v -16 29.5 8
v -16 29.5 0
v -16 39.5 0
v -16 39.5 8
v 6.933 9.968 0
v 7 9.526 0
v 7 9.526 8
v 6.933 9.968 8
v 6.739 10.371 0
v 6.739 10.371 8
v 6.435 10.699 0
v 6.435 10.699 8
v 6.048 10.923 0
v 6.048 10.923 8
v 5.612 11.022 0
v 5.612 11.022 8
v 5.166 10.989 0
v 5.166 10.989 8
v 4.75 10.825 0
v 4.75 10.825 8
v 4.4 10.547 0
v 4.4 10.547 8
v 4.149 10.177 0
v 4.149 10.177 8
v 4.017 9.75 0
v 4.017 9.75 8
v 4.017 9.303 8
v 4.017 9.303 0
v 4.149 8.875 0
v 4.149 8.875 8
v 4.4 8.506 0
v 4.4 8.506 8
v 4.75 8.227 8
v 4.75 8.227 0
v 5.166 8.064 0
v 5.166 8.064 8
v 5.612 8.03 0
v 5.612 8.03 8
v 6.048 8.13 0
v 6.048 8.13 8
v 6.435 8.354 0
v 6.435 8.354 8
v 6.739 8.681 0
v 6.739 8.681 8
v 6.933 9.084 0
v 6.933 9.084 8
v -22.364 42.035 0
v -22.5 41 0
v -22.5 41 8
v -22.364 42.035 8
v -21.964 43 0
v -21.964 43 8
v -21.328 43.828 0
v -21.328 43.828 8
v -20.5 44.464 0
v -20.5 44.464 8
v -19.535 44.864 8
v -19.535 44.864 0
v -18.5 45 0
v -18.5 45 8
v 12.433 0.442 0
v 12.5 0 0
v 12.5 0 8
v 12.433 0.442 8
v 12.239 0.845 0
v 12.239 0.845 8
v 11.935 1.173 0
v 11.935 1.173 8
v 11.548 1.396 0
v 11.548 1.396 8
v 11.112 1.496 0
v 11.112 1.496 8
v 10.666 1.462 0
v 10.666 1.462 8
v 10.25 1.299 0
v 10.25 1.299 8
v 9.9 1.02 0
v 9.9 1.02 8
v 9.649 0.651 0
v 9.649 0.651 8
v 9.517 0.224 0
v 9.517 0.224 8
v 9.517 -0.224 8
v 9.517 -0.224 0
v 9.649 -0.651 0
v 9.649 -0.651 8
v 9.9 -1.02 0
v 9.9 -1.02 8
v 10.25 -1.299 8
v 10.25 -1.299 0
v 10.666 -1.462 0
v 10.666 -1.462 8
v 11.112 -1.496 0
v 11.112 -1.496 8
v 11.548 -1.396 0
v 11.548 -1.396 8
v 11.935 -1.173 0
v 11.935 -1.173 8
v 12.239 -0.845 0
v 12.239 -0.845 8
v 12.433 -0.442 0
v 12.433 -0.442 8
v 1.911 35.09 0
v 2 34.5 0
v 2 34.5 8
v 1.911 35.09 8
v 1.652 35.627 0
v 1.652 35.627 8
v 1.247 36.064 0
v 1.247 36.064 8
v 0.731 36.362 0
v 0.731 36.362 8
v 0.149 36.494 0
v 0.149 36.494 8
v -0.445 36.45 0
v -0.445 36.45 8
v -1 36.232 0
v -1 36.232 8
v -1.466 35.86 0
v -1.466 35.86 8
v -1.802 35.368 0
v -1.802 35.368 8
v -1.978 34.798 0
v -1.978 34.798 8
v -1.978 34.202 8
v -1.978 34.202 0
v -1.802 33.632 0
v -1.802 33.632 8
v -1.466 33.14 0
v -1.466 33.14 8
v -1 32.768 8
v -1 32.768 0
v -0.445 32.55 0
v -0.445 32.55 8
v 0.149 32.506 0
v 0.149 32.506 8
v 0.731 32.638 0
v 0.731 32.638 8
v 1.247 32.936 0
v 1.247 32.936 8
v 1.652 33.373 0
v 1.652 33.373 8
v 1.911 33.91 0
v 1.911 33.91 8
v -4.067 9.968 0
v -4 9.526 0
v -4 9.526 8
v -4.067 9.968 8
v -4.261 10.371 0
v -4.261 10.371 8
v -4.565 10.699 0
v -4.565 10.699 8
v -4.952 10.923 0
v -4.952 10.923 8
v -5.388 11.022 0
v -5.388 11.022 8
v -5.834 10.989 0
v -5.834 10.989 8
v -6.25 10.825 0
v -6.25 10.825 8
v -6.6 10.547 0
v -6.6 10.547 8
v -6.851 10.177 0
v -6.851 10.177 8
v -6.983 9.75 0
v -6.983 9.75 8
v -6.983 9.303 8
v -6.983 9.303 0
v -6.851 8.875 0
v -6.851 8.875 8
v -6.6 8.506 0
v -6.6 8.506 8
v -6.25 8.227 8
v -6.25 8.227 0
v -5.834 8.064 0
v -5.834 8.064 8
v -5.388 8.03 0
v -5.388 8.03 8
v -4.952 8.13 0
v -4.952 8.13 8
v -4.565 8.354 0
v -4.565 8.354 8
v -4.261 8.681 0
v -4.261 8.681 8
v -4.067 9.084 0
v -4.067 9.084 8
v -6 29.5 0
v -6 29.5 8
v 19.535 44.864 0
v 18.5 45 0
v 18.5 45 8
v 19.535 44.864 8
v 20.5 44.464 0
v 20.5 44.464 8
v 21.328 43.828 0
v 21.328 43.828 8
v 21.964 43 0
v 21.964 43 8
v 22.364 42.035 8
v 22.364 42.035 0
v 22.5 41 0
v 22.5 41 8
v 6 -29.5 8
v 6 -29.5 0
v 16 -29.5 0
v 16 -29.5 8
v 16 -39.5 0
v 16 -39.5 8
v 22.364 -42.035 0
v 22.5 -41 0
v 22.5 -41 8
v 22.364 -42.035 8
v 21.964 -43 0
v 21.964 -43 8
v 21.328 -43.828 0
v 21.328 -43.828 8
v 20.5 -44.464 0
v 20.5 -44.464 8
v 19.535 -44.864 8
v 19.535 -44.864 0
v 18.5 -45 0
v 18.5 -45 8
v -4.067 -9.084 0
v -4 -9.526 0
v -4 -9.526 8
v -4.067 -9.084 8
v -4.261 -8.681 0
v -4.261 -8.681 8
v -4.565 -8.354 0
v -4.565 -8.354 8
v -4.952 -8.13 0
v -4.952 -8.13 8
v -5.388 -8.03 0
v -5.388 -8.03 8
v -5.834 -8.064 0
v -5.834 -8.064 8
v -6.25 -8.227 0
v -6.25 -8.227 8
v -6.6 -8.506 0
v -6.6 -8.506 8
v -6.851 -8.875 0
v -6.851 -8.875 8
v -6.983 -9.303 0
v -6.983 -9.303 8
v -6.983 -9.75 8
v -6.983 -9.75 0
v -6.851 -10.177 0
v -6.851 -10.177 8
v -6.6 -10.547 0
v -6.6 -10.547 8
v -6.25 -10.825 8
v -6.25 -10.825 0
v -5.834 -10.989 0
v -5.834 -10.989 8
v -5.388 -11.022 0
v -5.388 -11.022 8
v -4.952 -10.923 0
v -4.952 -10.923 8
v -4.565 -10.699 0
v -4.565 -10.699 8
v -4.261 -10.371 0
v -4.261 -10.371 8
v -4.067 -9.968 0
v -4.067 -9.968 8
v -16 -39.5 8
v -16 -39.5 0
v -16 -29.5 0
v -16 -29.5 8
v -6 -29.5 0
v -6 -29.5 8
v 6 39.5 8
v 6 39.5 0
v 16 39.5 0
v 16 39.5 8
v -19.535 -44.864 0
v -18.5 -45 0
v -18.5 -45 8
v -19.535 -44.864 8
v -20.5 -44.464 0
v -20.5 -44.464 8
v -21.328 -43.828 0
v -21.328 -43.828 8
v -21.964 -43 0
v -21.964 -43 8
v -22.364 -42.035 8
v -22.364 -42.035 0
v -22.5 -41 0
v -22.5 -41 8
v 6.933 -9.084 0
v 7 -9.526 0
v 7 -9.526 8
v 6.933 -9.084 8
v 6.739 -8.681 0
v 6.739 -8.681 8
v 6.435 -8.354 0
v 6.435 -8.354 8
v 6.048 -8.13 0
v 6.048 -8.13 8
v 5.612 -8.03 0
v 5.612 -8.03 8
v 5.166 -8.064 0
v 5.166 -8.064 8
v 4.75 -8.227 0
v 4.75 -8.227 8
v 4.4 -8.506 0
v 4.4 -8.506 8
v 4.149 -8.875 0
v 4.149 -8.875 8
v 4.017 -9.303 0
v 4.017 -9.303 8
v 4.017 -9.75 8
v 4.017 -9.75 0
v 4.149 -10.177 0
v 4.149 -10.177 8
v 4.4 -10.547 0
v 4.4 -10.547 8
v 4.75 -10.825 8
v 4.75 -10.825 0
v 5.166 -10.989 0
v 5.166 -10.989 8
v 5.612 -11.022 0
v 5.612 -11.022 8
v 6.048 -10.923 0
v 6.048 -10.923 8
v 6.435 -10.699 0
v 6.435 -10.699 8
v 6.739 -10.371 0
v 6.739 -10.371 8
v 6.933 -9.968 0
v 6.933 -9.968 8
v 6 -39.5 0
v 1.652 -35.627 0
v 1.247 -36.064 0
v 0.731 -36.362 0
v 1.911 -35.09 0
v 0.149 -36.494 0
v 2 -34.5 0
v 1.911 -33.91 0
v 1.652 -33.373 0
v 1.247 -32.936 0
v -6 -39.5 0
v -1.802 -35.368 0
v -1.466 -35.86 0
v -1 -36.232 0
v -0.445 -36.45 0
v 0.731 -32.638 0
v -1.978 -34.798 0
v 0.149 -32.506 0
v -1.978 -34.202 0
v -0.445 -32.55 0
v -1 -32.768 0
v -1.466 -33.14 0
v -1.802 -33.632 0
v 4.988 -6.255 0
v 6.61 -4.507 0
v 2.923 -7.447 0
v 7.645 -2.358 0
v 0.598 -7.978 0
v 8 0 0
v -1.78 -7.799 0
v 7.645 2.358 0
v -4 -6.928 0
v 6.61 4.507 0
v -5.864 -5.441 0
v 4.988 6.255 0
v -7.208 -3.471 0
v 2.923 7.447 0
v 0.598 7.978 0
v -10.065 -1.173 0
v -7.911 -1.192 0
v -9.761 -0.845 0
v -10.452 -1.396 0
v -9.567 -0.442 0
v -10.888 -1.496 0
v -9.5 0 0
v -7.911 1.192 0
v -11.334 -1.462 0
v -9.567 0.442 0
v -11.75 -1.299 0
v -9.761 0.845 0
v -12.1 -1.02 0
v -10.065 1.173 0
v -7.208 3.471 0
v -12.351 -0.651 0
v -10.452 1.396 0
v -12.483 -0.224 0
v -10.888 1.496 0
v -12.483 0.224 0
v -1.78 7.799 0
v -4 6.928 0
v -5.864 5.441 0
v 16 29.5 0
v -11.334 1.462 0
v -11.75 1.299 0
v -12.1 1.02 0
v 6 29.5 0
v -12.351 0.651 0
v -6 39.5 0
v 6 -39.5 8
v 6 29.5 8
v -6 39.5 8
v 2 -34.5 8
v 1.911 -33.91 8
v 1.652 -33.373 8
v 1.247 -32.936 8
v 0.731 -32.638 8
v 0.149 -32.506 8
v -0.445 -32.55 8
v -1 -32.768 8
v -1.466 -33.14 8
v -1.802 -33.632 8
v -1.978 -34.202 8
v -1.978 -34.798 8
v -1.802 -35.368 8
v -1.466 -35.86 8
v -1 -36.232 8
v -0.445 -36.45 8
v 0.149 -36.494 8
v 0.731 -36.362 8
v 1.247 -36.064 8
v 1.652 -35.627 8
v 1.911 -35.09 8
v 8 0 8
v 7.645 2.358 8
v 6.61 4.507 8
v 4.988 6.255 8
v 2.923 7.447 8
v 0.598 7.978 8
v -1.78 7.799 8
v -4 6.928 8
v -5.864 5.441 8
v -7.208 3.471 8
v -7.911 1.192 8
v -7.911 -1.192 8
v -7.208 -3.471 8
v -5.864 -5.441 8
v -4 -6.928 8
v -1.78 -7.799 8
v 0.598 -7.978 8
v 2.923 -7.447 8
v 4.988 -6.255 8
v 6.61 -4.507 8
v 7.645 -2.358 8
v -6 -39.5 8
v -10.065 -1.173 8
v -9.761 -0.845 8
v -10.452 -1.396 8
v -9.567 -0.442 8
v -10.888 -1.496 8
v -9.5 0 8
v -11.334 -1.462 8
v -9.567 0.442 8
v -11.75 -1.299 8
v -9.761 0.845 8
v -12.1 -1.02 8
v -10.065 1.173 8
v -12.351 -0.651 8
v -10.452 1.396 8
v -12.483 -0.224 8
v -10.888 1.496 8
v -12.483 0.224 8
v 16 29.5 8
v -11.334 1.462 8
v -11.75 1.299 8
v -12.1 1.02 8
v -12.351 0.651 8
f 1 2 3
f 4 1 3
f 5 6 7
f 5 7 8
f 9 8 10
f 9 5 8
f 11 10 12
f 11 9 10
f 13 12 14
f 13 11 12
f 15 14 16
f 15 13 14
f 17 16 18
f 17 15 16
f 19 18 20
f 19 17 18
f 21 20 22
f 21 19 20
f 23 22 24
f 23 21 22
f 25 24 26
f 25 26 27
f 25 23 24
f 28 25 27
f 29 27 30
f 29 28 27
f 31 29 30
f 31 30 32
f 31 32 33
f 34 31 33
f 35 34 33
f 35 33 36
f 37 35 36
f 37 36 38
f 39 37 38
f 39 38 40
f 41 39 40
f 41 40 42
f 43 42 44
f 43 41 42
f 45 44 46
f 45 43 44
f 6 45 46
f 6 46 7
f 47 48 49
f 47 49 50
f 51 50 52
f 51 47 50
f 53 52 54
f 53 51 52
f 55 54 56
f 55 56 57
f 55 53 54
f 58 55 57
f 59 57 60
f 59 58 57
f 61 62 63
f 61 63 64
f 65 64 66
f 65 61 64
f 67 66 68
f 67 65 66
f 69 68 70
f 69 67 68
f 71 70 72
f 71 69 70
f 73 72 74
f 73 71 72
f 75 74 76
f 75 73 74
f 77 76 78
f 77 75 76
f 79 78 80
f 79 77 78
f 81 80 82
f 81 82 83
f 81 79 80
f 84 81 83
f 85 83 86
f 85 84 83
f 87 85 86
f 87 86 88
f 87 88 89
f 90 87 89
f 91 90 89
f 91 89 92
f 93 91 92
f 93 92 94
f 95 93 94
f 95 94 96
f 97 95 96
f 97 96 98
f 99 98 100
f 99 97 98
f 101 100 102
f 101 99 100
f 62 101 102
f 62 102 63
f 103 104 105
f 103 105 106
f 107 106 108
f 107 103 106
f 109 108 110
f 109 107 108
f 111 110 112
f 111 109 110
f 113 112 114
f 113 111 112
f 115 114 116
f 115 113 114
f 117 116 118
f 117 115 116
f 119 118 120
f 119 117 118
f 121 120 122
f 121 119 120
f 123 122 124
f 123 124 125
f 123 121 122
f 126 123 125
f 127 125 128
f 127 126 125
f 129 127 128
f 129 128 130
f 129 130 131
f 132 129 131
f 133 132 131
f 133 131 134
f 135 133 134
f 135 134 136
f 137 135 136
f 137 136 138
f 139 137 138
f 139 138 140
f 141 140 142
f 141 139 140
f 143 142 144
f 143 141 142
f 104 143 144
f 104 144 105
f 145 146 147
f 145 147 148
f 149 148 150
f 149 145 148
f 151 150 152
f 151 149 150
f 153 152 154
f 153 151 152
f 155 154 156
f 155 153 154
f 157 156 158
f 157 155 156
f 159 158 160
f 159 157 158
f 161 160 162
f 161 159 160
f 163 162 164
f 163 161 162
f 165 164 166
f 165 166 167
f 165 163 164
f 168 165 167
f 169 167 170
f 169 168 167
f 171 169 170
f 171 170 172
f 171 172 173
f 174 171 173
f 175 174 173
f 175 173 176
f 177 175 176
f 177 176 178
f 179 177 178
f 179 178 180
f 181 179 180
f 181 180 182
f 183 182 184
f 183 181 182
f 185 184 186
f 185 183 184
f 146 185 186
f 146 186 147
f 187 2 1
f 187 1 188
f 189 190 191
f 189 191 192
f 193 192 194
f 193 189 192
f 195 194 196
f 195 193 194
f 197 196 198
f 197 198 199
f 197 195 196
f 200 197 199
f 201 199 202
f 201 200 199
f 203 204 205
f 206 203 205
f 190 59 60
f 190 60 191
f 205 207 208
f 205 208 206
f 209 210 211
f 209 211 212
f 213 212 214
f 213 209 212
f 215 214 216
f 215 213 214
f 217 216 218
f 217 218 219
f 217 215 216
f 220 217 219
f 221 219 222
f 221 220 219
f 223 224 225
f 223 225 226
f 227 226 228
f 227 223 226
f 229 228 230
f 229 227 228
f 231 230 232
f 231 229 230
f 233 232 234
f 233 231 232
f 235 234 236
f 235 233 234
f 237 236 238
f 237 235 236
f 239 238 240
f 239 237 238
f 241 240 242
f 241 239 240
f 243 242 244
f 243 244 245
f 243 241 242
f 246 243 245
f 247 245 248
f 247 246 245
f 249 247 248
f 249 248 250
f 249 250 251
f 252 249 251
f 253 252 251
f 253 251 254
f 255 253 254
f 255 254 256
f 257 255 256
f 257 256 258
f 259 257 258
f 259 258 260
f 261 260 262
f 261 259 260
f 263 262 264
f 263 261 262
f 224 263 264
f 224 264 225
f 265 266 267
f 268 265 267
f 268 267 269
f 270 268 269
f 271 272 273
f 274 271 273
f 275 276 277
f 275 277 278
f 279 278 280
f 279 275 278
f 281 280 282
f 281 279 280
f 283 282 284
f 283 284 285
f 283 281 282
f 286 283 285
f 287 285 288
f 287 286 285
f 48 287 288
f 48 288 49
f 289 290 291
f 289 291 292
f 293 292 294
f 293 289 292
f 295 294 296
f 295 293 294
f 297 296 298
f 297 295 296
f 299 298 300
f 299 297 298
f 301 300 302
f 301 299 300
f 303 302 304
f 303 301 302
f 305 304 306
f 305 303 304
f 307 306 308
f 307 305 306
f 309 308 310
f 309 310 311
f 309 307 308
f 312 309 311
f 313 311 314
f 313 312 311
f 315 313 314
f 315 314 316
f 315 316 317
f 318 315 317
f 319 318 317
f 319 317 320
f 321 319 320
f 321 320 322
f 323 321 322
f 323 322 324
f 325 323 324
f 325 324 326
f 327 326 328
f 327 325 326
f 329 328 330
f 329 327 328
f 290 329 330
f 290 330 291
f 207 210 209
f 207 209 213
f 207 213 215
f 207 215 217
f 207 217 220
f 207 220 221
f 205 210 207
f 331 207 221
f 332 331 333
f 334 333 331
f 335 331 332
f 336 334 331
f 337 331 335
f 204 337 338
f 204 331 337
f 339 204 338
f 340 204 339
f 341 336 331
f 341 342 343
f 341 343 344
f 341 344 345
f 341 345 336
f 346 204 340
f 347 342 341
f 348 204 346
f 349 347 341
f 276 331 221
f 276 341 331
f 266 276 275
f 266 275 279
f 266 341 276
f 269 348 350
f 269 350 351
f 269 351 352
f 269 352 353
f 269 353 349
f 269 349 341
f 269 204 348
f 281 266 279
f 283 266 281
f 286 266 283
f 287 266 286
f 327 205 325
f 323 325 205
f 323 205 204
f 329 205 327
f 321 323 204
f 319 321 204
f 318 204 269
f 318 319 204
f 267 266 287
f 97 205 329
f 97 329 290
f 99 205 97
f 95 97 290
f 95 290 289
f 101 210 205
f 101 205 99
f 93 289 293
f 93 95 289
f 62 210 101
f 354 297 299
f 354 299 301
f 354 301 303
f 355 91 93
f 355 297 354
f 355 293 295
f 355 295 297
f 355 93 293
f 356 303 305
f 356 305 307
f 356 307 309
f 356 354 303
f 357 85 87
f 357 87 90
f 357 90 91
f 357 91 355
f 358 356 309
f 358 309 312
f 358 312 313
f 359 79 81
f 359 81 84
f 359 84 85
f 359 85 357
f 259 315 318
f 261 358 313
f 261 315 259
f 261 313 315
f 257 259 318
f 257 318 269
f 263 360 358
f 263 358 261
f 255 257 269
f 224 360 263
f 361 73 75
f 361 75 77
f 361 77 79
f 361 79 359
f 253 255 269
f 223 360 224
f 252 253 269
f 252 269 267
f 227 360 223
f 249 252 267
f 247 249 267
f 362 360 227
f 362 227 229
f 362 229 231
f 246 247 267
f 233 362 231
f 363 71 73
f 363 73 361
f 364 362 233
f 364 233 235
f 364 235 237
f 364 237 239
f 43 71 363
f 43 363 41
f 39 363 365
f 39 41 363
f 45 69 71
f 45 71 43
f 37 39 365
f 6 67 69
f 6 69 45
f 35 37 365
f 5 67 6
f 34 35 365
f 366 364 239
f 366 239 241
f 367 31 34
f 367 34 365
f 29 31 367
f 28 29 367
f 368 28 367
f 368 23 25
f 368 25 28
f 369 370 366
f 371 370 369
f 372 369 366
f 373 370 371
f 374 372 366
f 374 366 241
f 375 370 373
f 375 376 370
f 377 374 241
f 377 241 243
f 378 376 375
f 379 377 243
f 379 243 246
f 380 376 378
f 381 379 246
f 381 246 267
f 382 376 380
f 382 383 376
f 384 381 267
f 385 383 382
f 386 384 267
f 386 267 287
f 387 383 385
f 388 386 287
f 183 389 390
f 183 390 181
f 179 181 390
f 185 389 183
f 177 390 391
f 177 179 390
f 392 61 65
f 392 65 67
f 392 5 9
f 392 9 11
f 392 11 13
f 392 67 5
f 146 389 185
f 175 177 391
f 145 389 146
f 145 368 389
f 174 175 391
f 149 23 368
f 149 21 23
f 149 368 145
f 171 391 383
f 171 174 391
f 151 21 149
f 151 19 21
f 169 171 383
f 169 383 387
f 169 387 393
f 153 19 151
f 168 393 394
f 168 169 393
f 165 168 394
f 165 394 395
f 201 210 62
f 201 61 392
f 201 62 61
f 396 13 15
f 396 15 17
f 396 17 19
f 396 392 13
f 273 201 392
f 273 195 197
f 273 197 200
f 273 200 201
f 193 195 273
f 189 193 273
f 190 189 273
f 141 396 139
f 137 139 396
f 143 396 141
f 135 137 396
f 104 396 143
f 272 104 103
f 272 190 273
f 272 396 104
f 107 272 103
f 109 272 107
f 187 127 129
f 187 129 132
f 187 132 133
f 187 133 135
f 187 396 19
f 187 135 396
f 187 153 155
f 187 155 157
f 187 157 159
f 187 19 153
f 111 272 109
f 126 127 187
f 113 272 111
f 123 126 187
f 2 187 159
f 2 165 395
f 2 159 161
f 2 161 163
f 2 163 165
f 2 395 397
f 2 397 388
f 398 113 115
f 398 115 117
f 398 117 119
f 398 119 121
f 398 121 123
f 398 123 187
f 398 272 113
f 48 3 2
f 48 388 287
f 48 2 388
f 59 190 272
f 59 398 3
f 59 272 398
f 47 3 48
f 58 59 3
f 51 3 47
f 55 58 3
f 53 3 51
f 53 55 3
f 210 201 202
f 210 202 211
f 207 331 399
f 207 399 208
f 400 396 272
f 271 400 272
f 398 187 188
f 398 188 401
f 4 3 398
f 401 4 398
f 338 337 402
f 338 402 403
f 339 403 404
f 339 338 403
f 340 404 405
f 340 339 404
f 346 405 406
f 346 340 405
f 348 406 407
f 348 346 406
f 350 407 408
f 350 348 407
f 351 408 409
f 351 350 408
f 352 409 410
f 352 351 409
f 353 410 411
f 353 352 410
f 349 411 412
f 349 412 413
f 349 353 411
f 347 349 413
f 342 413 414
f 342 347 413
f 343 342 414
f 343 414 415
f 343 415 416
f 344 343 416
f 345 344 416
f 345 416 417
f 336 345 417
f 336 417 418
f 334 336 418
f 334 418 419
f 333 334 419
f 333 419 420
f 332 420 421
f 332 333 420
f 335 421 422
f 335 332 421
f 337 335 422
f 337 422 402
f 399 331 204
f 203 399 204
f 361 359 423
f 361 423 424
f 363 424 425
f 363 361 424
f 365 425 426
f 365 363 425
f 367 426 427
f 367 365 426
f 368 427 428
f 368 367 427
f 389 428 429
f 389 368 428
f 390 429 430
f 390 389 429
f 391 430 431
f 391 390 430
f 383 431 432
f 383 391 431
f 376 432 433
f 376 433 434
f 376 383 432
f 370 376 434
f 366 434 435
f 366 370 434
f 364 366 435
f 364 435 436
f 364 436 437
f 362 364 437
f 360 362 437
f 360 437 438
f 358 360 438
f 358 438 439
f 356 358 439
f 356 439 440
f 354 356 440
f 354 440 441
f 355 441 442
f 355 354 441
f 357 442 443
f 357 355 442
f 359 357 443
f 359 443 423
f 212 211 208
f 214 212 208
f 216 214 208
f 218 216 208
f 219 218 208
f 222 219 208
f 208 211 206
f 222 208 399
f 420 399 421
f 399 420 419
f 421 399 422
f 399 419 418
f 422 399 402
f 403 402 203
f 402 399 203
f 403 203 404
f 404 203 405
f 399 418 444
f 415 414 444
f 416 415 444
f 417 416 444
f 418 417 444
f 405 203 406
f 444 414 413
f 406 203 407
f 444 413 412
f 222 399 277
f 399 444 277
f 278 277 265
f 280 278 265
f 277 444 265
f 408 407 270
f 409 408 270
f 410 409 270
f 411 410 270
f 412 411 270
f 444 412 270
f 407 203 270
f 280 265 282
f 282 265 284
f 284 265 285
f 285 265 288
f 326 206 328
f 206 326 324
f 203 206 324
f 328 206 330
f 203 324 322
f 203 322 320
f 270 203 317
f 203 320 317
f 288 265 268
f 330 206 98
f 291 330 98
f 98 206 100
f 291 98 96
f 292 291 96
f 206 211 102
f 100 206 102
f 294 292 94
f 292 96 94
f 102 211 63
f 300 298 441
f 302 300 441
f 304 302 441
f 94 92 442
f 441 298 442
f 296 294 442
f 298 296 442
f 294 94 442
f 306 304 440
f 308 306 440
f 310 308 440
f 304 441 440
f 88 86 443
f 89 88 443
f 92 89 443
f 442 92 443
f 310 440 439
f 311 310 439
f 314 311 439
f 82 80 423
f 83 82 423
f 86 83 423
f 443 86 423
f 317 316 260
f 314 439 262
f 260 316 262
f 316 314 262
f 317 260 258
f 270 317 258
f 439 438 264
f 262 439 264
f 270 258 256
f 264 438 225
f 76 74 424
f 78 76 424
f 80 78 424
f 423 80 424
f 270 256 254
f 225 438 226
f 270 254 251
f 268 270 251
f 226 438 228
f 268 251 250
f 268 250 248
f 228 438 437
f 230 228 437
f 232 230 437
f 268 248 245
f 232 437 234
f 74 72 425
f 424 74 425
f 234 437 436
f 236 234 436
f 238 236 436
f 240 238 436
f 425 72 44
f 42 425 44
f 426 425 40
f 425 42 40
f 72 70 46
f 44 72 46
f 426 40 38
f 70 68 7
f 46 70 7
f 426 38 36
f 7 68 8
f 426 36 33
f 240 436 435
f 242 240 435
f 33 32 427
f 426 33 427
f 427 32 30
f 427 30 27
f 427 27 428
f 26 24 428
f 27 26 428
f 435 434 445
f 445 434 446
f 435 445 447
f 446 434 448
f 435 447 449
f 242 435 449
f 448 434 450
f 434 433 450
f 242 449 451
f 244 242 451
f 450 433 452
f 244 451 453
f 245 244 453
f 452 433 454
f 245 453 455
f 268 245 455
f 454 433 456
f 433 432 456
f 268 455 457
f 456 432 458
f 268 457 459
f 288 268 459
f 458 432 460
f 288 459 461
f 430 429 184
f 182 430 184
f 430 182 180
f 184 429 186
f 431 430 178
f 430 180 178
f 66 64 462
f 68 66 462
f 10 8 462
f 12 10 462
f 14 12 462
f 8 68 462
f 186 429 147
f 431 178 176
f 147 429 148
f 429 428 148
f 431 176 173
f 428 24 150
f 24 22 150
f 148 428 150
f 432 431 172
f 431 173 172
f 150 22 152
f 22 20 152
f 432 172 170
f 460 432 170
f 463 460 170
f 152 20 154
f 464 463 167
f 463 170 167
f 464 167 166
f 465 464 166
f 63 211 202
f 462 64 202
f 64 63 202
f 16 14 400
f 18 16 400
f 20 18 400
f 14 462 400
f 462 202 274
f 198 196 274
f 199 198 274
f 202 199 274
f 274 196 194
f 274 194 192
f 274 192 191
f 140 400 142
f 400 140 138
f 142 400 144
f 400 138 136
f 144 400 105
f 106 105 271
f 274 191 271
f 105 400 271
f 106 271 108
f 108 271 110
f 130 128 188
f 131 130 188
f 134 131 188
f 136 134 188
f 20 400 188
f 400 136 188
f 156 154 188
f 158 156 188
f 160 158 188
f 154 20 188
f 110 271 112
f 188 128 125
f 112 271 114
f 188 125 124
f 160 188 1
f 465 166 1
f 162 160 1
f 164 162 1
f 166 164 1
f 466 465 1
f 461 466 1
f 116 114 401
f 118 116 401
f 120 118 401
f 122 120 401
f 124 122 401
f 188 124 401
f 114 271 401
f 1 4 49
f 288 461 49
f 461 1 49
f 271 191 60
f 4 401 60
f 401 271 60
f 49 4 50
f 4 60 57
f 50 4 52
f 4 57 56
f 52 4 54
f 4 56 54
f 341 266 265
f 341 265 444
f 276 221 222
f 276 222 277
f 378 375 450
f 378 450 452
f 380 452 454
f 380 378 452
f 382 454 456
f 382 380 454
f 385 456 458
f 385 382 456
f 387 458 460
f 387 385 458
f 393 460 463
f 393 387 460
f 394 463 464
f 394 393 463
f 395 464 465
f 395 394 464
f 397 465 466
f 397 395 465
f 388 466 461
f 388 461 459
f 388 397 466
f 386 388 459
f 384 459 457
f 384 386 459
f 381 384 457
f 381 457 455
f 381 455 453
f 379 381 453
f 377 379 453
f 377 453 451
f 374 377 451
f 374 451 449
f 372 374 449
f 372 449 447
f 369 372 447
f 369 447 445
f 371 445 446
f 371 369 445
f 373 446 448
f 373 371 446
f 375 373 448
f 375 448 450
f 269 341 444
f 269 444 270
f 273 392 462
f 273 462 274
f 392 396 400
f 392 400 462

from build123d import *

# Parameters (mm, degrees)
SKETCH1_R           = 8
SKETCH1_R_2         = 1.5
SKETCH1_R_3         = 2
SKETCH1_W           = 10
SKETCH1_H           = 10
BOSS_EXTRUDE2_DEPTH = 8


with BuildPart() as part:
    # Sketch1 → Boss-Extrude2 (new body)
    with BuildSketch(Plane.XY):
        with BuildLine():
            Line((18.5, -45), (-18.5, -45))
            ThreePointArc((-18.5, -45), (-21.328427125, -43.828427125), (-22.5, -41))
            Line((-22.5, -41), (-22.5, 41))
            ThreePointArc((-22.5, 41), (-21.328427125, 43.828427125), (-18.5, 45))
            Line((-18.5, 45), (18.5, 45))
            ThreePointArc((18.5, 45), (21.328427125, 43.828427125), (22.5, 41))
            Line((22.5, 41), (22.5, -41))
            ThreePointArc((22.5, -41), (21.328427125, -43.828427125), (18.5, -45))
        make_face()
        Circle(SKETCH1_R, mode=Mode.SUBTRACT)
        with Locations((-11, 0)):
            Circle(SKETCH1_R_2, mode=Mode.SUBTRACT)
        with Locations((-5.5, 9.526279442)):
            Circle(SKETCH1_R_2, mode=Mode.SUBTRACT)
        with Locations((5.5, 9.526279442)):
            Circle(SKETCH1_R_2, mode=Mode.SUBTRACT)
        with Locations((11, 0)):
            Circle(SKETCH1_R_2, mode=Mode.SUBTRACT)
        with Locations((5.5, -9.526279442)):
            Circle(SKETCH1_R_2, mode=Mode.SUBTRACT)
        with Locations((-5.5, -9.526279442)):
            Circle(SKETCH1_R_2, mode=Mode.SUBTRACT)
        with Locations((0, -34.5)):
            Circle(SKETCH1_R_3, mode=Mode.SUBTRACT)
        with Locations((0, 34.5)):
            Circle(SKETCH1_R_3, mode=Mode.SUBTRACT)
        with Locations((-11, -34.5)):
            Rectangle(SKETCH1_W, SKETCH1_H, mode=Mode.SUBTRACT)
        with Locations((11, -34.5)):
            Rectangle(SKETCH1_W, SKETCH1_H, mode=Mode.SUBTRACT)
        with Locations((11, 34.5)):
            Rectangle(SKETCH1_W, SKETCH1_H, mode=Mode.SUBTRACT)
        with Locations((-11, 34.5)):
            Rectangle(SKETCH1_W, SKETCH1_H, mode=Mode.SUBTRACT)
    extrude(amount=BOSS_EXTRUDE2_DEPTH)


solid = part.part
